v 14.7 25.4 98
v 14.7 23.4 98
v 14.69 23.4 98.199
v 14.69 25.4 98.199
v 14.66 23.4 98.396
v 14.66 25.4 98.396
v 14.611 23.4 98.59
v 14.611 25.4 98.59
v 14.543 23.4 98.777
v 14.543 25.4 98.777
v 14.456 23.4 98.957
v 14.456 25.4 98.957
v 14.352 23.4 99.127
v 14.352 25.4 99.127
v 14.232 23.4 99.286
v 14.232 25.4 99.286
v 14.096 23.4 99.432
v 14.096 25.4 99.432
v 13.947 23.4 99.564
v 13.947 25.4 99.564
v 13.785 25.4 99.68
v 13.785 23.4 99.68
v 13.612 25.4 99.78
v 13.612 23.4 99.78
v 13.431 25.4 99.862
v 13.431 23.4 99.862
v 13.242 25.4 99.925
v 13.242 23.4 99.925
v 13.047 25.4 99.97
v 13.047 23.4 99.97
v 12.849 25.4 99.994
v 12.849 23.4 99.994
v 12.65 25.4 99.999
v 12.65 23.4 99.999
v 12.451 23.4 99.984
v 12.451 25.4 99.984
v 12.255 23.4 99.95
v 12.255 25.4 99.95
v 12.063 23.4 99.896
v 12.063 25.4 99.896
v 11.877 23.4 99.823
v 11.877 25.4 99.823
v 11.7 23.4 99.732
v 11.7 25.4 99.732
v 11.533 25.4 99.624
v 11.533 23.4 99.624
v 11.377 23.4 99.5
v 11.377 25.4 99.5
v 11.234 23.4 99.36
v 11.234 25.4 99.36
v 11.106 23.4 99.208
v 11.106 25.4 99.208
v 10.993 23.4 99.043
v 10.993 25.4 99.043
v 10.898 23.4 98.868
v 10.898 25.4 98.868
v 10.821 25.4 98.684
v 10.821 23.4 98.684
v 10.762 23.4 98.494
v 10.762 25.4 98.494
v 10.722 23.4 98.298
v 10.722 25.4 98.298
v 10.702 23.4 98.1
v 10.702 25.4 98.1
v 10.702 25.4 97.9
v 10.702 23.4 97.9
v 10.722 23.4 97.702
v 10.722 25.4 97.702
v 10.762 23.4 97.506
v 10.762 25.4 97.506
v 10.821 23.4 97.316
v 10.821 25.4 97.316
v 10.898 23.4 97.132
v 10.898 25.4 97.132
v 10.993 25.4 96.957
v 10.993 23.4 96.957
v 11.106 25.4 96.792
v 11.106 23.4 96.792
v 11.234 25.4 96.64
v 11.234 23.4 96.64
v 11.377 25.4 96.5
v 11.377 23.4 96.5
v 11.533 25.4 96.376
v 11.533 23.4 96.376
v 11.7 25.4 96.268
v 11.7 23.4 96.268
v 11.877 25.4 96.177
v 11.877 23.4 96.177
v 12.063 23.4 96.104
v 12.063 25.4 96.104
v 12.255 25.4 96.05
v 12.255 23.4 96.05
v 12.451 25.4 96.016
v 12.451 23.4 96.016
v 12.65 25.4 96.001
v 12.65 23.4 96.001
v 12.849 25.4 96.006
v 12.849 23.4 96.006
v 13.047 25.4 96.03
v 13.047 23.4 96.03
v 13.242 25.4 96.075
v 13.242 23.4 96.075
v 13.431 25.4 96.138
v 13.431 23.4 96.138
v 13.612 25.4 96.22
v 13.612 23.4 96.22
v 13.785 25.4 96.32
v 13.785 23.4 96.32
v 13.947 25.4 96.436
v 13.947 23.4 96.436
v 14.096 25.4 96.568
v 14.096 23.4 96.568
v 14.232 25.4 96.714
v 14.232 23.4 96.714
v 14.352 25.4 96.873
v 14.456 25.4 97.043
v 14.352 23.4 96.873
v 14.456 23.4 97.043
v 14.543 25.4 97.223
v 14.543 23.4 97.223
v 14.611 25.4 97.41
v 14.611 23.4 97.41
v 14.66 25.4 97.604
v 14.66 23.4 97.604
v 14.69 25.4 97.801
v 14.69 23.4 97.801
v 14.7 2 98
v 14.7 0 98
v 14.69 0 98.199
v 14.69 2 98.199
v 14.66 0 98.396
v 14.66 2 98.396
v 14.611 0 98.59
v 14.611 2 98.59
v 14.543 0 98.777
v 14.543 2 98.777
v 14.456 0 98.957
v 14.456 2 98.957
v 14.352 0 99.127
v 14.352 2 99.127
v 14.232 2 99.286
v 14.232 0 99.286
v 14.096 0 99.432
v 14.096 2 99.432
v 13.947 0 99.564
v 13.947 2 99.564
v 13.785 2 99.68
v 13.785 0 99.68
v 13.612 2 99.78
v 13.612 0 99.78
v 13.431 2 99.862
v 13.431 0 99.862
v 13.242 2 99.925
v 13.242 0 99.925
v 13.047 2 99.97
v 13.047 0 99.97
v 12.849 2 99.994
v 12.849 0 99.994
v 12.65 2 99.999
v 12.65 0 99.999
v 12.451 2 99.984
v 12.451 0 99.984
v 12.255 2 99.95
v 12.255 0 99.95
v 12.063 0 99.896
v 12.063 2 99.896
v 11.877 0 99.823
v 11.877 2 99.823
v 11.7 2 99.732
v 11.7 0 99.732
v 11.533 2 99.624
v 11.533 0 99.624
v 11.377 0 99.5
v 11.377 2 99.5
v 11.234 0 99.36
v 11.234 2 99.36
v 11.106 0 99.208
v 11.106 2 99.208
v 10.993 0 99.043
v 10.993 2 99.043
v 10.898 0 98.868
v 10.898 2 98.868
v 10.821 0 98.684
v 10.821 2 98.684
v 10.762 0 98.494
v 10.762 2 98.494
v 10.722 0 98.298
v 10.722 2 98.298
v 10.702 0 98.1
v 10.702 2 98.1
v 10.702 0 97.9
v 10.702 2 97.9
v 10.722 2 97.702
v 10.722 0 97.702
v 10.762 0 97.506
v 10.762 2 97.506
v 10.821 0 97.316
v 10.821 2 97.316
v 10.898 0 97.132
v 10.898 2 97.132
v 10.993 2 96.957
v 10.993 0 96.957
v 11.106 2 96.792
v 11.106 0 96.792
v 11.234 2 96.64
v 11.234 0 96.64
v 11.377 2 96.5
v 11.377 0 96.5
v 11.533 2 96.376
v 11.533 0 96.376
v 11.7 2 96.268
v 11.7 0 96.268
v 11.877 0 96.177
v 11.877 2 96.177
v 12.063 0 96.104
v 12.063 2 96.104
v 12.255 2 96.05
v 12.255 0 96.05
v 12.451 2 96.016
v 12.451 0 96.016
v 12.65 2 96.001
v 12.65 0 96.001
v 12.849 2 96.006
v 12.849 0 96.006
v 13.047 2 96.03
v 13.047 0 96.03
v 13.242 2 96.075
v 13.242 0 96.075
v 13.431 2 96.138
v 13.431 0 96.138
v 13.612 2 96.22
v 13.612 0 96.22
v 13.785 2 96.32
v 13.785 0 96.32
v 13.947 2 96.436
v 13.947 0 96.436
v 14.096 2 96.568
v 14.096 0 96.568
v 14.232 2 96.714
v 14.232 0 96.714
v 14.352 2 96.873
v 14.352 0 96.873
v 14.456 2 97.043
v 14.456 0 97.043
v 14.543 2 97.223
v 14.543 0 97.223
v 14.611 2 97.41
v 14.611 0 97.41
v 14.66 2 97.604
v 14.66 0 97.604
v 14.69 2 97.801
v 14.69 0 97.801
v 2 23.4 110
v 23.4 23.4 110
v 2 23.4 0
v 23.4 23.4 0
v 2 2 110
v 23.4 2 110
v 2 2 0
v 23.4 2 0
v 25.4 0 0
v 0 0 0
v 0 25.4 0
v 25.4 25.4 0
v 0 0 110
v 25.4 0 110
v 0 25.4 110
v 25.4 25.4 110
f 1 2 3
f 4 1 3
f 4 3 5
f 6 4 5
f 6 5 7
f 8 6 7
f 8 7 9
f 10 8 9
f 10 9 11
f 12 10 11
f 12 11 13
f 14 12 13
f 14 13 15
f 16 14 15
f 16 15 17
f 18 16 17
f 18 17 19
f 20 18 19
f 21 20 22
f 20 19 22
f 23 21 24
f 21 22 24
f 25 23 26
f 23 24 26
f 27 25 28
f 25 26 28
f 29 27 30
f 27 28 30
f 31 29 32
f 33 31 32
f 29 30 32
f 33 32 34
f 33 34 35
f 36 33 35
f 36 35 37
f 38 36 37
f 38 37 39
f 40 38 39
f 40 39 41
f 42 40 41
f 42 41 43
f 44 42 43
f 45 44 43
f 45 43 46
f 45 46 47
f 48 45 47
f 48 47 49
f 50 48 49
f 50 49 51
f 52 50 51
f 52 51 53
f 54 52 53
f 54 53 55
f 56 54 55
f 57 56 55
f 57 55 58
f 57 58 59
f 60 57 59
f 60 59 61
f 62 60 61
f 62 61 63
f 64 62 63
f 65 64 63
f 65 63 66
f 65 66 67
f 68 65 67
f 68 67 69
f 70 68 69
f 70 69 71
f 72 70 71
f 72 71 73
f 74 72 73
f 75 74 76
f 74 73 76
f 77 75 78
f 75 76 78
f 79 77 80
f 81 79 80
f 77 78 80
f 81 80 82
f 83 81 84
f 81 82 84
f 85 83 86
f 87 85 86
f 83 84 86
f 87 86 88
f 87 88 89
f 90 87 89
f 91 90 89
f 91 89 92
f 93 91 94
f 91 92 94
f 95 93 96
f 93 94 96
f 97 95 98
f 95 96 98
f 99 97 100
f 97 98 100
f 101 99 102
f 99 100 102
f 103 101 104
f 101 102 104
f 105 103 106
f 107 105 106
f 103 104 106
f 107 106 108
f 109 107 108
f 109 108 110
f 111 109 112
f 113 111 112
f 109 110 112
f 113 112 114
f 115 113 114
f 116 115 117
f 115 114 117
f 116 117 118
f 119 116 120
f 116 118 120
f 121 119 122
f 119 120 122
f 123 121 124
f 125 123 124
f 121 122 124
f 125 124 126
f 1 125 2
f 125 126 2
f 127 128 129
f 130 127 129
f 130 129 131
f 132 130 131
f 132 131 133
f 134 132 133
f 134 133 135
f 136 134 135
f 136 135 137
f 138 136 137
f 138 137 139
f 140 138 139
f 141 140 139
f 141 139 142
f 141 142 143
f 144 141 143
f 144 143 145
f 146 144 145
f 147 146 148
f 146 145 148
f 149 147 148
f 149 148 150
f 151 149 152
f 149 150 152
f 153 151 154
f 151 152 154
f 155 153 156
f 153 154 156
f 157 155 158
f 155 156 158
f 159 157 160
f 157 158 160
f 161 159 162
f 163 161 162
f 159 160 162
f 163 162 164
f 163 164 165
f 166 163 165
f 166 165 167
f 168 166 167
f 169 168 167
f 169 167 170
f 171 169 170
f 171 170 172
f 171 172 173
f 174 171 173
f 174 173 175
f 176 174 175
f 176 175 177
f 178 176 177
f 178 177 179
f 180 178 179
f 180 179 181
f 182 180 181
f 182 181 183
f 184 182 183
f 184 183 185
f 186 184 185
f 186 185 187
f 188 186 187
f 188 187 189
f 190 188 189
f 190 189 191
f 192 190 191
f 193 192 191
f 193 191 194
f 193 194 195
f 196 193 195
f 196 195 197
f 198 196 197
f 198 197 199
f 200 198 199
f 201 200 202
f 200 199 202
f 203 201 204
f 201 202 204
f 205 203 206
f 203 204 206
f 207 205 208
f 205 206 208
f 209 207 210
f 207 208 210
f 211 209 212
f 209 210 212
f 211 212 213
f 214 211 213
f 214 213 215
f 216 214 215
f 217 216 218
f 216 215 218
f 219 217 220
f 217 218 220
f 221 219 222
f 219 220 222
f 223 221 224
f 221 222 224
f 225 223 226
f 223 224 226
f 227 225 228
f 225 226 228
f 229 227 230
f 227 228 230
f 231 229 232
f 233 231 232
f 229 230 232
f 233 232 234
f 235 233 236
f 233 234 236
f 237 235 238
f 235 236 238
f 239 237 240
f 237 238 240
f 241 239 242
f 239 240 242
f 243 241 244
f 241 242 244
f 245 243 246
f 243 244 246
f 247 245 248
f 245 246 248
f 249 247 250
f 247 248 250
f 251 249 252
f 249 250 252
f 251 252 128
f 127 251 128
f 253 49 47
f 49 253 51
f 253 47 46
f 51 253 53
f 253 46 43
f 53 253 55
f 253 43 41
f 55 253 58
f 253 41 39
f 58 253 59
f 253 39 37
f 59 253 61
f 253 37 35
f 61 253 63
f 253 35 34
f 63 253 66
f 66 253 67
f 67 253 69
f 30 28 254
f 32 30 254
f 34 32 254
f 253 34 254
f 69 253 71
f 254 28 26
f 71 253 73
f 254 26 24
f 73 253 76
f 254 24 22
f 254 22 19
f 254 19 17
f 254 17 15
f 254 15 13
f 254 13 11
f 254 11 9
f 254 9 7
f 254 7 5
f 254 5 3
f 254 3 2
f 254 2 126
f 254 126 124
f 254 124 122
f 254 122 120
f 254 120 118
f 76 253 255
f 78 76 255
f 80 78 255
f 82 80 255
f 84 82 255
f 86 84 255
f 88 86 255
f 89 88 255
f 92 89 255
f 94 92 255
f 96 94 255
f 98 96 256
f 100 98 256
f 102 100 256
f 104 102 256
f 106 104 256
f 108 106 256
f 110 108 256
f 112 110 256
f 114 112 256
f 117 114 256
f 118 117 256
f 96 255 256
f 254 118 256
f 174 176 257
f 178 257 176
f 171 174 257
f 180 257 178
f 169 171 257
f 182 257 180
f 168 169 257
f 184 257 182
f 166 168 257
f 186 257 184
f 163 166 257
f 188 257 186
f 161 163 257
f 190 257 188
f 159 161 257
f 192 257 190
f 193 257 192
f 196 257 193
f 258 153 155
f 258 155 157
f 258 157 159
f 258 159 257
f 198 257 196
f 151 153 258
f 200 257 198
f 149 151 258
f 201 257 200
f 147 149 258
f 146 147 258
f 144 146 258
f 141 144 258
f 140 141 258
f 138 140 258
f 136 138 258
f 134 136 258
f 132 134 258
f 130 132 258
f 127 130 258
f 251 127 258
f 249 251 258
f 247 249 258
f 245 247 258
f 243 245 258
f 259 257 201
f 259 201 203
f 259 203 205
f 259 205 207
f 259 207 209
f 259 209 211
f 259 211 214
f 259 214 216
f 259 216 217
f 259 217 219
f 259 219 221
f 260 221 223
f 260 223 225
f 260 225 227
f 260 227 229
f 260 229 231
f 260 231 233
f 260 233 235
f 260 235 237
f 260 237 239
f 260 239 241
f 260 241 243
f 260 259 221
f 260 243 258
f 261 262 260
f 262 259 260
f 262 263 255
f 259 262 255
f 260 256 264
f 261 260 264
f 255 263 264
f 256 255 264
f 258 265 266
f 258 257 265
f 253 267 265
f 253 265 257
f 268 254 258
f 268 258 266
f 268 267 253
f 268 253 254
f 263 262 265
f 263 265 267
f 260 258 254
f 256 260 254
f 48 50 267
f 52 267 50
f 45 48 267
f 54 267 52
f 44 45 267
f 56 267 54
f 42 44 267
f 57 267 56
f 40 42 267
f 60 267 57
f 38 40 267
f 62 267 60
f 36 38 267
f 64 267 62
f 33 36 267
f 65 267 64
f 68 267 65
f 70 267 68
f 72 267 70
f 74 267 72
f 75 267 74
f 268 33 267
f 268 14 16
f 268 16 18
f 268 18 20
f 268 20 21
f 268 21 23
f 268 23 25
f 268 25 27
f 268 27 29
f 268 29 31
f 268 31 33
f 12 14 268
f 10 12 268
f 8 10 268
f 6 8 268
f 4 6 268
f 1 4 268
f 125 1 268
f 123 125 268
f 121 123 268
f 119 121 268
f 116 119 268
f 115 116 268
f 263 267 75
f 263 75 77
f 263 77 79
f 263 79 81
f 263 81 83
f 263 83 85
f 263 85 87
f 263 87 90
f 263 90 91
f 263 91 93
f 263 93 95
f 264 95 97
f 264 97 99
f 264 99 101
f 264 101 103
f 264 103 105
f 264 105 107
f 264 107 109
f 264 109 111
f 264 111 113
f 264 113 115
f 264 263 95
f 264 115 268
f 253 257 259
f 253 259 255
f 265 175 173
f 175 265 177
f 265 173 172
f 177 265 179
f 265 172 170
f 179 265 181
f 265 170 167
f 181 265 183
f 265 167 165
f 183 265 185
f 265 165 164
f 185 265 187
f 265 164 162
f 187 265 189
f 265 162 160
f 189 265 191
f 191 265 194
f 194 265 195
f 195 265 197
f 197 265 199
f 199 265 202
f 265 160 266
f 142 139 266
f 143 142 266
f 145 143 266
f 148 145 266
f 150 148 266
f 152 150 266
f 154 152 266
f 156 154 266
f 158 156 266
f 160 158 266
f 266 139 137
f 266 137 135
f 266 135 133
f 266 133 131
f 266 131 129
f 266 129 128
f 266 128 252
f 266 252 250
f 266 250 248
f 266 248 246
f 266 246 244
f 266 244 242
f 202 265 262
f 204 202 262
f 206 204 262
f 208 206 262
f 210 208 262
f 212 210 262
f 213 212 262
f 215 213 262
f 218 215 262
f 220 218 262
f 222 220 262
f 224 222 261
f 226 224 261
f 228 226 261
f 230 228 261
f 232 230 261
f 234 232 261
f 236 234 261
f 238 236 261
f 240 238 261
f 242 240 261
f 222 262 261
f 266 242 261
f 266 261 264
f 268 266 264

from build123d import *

# Parameters (mm, degrees)
SKETCH1_W           = 25.4
SKETCH1_H           = 25.4
SKETCH1_W_2         = 21.4
SKETCH1_H_2         = 21.4
BOSS_EXTRUDE1_DEPTH = 110
SKETCH2_R           = 2
CUT_EXTRUDE1_DEPTH  = 26.4


with BuildPart() as part:
    # Sketch1 → Boss-Extrude1 (new body)
    with BuildSketch(Plane.XY):
        with Locations((12.7, 12.7)):
            Rectangle(SKETCH1_W, SKETCH1_H)
        with Locations((12.7, 12.7)):
            Rectangle(SKETCH1_W_2, SKETCH1_H_2, mode=Mode.SUBTRACT)
    extrude(amount=BOSS_EXTRUDE1_DEPTH)

    # Sketch2 → Cut-Extrude1 (cut, through all)
    with BuildSketch(Plane.XZ):
        with Locations((12.7, 98)):
            Circle(SKETCH2_R)
    extrude(amount=-CUT_EXTRUDE1_DEPTH, mode=Mode.SUBTRACT)


solid = part.part
